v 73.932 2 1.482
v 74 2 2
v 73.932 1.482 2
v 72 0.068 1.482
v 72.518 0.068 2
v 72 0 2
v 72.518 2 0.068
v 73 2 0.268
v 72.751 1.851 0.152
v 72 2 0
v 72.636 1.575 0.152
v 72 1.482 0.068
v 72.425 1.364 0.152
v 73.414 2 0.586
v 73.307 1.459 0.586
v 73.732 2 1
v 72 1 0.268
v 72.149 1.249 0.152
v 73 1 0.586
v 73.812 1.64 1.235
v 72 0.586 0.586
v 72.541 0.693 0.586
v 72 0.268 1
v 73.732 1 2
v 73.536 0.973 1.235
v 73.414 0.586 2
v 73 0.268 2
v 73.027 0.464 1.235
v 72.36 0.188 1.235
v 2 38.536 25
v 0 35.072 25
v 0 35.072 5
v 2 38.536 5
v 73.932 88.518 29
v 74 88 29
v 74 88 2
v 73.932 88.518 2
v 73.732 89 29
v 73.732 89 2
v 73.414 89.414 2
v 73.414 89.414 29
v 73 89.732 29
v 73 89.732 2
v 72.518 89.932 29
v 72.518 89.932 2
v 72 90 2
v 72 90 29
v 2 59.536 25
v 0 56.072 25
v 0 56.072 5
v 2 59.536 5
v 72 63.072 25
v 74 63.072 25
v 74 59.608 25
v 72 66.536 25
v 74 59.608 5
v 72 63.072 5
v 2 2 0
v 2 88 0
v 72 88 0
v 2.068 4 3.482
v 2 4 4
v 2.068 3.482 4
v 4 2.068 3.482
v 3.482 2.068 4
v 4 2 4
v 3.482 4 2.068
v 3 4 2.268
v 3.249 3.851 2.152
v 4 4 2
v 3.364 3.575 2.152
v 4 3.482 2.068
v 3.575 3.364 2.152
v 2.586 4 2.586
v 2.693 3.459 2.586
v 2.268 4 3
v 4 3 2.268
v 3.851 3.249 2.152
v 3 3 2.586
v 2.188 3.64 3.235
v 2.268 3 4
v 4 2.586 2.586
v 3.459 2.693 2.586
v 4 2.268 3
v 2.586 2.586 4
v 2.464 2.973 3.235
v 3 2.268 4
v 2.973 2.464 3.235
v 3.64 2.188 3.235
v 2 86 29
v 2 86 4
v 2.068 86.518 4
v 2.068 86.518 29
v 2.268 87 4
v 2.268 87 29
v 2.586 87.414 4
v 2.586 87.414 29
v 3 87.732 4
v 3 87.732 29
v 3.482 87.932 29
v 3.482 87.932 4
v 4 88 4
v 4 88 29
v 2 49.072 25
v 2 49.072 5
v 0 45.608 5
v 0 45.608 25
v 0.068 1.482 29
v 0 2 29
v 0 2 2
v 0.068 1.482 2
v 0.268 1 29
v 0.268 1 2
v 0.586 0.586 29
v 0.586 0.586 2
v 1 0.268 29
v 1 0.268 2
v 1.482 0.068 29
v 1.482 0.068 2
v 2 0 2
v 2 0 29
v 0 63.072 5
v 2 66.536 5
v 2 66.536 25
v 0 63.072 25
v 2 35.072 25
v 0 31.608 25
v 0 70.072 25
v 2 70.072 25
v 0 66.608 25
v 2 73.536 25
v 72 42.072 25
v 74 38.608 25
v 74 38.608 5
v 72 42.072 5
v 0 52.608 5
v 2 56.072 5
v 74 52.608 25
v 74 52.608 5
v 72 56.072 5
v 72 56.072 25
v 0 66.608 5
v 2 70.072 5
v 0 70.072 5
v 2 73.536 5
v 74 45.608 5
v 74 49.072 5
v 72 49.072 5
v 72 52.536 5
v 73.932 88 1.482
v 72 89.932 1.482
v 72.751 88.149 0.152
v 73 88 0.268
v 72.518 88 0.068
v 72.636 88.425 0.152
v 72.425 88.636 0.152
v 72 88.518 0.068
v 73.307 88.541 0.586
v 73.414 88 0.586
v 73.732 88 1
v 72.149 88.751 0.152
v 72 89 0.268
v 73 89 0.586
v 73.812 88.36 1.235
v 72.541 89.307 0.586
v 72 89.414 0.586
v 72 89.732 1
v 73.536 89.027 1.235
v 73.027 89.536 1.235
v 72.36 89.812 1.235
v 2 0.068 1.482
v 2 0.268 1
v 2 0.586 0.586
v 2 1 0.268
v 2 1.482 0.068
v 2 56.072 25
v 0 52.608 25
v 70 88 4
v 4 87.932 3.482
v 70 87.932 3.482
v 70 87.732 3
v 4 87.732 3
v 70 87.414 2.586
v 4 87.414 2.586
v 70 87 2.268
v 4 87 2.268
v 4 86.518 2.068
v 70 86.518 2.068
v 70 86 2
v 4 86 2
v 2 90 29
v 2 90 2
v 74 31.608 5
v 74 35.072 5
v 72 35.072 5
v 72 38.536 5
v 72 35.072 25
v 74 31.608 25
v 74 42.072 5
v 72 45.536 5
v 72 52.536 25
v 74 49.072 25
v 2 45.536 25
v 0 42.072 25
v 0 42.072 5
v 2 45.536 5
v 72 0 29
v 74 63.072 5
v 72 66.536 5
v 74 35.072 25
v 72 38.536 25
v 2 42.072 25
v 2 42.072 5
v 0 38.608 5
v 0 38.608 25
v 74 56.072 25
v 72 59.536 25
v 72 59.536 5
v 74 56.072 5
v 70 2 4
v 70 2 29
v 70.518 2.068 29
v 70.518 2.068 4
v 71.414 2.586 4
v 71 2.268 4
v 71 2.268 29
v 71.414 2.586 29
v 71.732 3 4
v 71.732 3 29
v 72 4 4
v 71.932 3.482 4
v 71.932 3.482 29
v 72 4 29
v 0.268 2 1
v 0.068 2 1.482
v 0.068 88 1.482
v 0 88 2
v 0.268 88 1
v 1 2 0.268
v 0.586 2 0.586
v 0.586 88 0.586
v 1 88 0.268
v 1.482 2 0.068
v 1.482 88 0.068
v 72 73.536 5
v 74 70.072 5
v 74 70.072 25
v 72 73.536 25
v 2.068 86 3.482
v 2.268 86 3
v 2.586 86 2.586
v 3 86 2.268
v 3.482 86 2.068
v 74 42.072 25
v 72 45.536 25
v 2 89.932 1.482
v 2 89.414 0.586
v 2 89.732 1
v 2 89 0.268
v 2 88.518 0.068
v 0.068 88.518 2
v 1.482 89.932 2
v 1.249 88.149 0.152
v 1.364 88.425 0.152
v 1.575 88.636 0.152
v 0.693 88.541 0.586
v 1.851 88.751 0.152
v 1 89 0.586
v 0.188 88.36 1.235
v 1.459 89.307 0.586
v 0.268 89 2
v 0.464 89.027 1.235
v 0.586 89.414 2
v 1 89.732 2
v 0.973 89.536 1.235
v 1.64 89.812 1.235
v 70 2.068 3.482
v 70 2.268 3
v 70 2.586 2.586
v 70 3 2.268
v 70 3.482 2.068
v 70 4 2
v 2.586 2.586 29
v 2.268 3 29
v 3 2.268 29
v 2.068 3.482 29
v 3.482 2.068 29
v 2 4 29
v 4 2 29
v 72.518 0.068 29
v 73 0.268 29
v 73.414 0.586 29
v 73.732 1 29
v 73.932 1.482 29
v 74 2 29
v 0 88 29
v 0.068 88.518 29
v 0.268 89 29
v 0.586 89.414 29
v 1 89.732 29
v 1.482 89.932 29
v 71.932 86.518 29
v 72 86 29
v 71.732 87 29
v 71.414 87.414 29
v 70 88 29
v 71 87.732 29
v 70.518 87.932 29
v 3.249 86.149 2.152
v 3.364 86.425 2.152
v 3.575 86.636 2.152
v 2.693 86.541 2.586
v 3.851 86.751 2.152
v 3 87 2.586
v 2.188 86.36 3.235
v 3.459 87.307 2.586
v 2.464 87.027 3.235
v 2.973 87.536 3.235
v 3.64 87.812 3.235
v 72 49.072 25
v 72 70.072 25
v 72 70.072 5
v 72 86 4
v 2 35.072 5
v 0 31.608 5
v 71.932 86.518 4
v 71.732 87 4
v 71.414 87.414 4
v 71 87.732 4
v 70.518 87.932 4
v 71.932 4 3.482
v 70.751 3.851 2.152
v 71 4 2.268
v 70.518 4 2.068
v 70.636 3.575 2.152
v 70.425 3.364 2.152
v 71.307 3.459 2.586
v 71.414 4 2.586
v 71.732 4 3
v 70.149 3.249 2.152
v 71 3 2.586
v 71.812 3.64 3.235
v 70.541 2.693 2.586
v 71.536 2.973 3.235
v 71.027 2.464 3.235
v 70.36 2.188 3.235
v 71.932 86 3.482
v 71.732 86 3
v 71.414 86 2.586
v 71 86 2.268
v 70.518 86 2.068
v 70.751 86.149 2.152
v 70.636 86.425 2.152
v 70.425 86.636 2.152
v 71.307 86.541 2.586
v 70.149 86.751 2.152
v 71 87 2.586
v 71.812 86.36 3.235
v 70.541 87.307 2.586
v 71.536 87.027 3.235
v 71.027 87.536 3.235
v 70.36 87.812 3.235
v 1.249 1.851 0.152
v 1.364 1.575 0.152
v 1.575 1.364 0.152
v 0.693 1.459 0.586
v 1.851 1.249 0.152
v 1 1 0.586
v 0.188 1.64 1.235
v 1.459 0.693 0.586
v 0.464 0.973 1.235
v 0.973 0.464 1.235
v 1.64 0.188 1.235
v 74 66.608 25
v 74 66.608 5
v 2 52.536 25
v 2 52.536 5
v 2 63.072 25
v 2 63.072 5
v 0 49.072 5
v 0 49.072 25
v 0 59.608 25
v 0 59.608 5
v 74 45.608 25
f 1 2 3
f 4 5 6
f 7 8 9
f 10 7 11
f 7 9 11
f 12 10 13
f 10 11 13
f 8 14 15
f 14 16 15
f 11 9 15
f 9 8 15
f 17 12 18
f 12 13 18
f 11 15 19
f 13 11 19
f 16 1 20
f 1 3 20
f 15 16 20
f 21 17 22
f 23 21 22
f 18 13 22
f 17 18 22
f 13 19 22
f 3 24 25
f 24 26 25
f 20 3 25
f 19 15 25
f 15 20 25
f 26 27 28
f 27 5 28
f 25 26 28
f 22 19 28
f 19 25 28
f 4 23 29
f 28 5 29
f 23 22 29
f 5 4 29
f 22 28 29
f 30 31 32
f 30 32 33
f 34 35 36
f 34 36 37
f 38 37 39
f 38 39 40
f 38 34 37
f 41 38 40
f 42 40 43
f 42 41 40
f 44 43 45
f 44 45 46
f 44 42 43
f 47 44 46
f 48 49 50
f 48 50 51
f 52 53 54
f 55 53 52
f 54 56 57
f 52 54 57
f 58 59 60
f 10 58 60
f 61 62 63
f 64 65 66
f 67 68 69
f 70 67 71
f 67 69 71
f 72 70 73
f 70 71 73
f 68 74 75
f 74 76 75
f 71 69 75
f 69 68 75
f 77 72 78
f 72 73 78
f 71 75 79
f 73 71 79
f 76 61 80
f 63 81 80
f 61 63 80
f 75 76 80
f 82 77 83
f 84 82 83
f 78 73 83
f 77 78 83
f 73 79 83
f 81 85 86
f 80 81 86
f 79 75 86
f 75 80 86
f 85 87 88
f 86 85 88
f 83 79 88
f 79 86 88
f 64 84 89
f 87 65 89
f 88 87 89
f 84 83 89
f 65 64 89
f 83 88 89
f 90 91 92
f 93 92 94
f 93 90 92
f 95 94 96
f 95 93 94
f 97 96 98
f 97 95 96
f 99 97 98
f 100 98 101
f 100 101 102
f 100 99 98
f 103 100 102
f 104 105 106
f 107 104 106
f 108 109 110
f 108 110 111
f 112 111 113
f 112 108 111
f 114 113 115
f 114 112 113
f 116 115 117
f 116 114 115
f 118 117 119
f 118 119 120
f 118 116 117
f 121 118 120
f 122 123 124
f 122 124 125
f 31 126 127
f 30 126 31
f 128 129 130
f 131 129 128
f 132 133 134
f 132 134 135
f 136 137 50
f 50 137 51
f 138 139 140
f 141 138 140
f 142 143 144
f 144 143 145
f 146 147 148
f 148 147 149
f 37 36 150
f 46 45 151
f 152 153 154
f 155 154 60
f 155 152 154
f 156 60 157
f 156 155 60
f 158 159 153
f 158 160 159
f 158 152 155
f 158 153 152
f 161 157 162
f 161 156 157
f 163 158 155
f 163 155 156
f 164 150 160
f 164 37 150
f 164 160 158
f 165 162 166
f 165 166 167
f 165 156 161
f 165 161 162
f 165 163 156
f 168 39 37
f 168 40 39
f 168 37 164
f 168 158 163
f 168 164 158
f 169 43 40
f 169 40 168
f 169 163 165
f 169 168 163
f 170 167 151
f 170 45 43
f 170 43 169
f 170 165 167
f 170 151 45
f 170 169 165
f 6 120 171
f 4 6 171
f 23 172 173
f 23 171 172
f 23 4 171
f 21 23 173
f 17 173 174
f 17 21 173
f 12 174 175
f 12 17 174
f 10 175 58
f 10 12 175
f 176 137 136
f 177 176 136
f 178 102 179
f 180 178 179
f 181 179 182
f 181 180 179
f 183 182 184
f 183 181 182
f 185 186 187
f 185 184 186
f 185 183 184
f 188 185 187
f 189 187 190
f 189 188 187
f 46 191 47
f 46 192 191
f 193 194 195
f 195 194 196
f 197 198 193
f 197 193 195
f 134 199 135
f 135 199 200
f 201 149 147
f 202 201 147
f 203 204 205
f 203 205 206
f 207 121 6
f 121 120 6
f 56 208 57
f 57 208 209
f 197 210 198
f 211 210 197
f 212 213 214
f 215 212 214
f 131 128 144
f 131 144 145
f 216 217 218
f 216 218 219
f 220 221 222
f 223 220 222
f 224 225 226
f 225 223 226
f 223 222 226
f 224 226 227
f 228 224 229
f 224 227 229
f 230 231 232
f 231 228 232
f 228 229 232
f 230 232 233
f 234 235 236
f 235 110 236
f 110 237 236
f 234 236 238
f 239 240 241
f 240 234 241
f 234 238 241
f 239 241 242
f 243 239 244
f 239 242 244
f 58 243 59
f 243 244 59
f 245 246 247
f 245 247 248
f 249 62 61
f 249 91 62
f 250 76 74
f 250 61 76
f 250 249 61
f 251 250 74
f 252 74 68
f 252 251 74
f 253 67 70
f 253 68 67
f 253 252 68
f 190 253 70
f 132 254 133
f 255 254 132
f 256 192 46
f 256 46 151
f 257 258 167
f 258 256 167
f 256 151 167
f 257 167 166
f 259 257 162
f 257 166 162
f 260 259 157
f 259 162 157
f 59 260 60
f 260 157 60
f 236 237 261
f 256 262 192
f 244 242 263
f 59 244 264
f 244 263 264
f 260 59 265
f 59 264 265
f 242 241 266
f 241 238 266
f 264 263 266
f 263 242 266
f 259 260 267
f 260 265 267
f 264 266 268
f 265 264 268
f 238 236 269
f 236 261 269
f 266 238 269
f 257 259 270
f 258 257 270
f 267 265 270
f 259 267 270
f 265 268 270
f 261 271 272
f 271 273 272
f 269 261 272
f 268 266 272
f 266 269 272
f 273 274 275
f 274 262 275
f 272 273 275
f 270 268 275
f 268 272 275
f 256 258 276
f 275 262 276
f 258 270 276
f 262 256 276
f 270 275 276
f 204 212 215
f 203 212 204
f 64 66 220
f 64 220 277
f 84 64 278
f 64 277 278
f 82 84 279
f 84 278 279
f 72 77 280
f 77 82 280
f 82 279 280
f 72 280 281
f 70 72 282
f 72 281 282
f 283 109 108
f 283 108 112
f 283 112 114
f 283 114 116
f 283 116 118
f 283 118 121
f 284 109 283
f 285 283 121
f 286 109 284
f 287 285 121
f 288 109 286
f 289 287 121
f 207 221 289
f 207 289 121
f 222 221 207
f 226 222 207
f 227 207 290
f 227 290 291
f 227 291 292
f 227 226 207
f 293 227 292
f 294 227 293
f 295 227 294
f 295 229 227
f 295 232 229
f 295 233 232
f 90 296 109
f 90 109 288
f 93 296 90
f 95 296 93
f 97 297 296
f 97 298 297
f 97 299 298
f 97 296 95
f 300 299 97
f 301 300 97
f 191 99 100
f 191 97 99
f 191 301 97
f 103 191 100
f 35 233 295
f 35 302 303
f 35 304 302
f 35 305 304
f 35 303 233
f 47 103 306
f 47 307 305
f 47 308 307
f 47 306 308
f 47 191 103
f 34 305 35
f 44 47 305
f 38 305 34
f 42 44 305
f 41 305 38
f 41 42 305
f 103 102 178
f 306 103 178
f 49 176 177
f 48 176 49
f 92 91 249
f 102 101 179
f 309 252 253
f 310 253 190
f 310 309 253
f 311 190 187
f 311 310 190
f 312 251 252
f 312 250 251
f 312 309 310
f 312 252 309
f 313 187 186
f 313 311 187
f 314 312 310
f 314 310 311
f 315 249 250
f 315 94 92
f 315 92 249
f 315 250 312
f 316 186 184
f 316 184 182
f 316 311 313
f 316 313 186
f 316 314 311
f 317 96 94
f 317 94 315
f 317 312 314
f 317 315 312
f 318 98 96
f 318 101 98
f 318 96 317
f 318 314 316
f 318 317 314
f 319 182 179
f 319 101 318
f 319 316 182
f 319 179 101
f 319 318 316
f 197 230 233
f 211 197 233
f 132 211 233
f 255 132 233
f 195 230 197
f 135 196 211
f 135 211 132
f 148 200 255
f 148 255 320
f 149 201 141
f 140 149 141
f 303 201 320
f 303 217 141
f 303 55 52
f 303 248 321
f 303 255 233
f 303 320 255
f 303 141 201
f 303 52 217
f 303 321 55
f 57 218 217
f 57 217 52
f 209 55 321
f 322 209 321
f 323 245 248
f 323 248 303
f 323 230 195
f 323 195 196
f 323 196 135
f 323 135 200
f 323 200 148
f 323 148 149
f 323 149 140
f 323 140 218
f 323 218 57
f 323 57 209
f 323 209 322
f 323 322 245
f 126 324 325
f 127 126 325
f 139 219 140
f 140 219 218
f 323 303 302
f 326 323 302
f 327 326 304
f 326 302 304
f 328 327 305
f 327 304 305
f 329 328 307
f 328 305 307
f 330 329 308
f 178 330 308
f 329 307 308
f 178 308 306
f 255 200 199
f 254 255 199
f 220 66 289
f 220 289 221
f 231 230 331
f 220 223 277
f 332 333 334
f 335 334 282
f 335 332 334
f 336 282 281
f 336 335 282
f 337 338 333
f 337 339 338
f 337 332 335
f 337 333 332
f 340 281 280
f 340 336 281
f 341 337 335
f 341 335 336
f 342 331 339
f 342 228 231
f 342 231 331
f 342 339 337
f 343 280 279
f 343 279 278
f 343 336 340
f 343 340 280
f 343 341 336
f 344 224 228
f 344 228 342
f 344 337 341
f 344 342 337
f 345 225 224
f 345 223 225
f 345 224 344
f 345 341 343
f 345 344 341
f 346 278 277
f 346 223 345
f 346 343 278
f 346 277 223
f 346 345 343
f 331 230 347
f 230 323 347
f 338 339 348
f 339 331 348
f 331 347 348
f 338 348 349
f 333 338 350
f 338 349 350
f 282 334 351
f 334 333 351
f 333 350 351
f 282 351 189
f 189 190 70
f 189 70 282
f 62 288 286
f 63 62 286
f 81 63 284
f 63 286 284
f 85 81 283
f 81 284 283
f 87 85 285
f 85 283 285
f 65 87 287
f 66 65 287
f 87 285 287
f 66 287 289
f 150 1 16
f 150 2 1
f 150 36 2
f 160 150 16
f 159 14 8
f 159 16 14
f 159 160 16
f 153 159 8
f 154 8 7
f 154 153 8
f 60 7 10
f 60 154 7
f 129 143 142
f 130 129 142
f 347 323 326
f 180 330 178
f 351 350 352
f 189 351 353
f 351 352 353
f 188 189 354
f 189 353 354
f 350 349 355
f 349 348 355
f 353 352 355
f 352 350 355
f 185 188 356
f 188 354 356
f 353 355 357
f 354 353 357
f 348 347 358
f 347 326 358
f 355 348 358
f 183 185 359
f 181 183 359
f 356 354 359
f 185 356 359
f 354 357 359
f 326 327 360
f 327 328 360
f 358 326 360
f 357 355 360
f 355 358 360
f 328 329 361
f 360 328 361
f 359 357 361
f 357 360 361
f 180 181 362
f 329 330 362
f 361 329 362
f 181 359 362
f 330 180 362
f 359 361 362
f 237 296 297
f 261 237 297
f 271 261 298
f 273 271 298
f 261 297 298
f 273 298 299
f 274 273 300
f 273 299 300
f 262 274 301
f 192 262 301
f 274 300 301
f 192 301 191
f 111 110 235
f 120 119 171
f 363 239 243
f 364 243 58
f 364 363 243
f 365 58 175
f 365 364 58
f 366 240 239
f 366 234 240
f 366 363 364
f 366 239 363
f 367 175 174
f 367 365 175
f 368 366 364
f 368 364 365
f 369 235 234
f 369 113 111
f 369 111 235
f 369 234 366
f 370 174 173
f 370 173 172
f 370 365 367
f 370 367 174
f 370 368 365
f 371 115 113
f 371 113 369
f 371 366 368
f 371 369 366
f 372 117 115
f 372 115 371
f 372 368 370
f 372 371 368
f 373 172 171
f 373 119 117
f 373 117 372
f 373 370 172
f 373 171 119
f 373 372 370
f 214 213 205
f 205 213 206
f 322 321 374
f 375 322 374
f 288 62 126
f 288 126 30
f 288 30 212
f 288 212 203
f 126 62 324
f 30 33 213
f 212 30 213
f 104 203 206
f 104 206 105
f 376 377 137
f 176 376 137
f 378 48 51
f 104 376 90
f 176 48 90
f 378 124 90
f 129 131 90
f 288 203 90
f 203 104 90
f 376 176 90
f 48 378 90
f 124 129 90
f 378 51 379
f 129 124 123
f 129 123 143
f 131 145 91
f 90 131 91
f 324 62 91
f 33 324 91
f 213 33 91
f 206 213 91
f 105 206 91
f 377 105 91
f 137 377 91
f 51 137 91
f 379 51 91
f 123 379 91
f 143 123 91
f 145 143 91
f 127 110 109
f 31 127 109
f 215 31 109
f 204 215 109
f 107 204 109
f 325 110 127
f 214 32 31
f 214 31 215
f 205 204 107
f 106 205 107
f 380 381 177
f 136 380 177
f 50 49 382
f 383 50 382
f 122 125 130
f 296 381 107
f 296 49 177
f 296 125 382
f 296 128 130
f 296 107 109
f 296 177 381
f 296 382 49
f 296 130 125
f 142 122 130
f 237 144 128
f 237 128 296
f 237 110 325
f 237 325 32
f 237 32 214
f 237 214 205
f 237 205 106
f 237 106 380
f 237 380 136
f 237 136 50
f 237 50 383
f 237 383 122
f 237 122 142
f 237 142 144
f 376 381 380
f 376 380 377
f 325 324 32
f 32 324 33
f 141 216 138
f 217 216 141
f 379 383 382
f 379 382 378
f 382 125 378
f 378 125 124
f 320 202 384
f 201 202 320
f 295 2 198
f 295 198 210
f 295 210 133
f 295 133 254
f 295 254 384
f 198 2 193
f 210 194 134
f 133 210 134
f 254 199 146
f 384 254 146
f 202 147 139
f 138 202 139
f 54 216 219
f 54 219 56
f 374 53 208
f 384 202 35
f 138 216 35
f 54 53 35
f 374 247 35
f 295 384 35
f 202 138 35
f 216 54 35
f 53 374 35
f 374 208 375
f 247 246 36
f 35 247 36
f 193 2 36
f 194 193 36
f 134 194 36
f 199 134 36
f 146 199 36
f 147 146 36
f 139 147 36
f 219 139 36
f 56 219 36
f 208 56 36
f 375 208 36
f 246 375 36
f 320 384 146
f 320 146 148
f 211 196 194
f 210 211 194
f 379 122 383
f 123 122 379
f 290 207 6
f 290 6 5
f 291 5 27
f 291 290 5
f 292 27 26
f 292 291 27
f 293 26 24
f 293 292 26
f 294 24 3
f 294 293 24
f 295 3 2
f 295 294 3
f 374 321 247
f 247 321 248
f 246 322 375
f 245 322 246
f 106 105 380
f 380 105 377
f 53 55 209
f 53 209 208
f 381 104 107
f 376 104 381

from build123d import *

# Parameters (mm, degrees)
EXTRUDE007_DEPTH = 20
BOX003_W         = 70
BOX003_H         = 86
BOX003_DEPTH     = 39
FILLET001_R      = 2
BOX002_W         = 74
BOX002_H         = 90
BOX002_DEPTH     = 29
FILLET_R         = 2


with BuildPart() as ventsbottomcut:
    # Sketch007 → Extrude007 (new body)
    with BuildSketch(Plane.XY):
        Polygon((4, 77), (6, 76.999982), (-3.999992, 59.679487), (-5.999992, 59.679487), align=None)
        Polygon((-5.999992, 52.679487), (-3.999992, 52.679487), (6, 70), (4, 70), align=None)
        Polygon((-3.999992, 45.679487), (-5.999992, 45.679487), (4, 63), (6, 63), align=None)
        Polygon((4, 56), (6, 56), (-3.999992, 38.679487), (-5.999992, 38.679487), align=None)
        Polygon((4, 49), (6, 49), (-3.999992, 31.679487), (-5.999992, 31.679487), align=None)
        Polygon((4, 42), (6, 42), (-3.999992, 24.679487), (-5.999992, 24.679487), align=None)
        Polygon((70, 77), (68, 77), (78, 59.679492), (80, 59.679492), align=None)
        Polygon((68, 70), (70, 70), (80, 52.679492), (78, 52.679492), align=None)
        Polygon((68, 63), (70, 63), (80, 45.679492), (78, 45.679492), align=None)
        Polygon((68, 56), (70, 56), (80, 38.679492), (78, 38.679492), align=None)
        Polygon((68, 49), (70, 49), (80, 31.679492), (78, 31.679492), align=None)
        Polygon((68, 42), (70, 42), (80, 24.679492), (78, 24.679492), align=None)
    extrude(amount=EXTRUDE007_DEPTH)


with BuildPart() as ventsbottomcut_1:
    # Extrude007 placement: moved
    add(ventsbottomcut.part.moved(Location((0, 0, 5))))


with BuildPart() as bottomcut:
    # Box003 → Box003 (new body)
    with BuildSketch(Plane(origin=(2, 2, 2), x_dir=(1, 0, 0), z_dir=(0, 0, 1))):
        with Locations((35, 43)):
            Rectangle(BOX003_W, BOX003_H)
    extrude(amount=BOX003_DEPTH)

    # Fillet001
    fillet001_edges = [bottomcut.edges().sort_by_distance(p)[0] for p in [
        (2, 2, 21.5),
        (2, 88, 21.5),
        (2, 45, 2),
        (72, 2, 21.5),
        (72, 88, 21.5),
        (72, 45, 2),
        (37, 2, 2),
        (37, 88, 2),
    ]]
    fillet(fillet001_edges, radius=FILLET001_R)


with BuildPart() as bottom004done:
    # Box002 → Box002 (new body)
    with BuildSketch(Plane.XY):
        with Locations((37, 45)):
            Rectangle(BOX002_W, BOX002_H)
    extrude(amount=BOX002_DEPTH)

    # Fillet
    fillet_edges = [bottom004done.edges().sort_by_distance(p)[0] for p in [
        (0, 0, 14.5),
        (0, 90, 14.5),
        (0, 45, 0),
        (74, 0, 14.5),
        (74, 90, 14.5),
        (74, 45, 0),
        (37, 0, 0),
        (37, 90, 0),
    ]]
    fillet(fillet_edges, radius=FILLET_R)

    # Cut: cut bottomCut
    add(bottomcut.part, mode=Mode.SUBTRACT)

    # Cut002: cut ventsBottomCut
    add(ventsbottomcut_1.part, mode=Mode.SUBTRACT)


solid = bottom004done.part
